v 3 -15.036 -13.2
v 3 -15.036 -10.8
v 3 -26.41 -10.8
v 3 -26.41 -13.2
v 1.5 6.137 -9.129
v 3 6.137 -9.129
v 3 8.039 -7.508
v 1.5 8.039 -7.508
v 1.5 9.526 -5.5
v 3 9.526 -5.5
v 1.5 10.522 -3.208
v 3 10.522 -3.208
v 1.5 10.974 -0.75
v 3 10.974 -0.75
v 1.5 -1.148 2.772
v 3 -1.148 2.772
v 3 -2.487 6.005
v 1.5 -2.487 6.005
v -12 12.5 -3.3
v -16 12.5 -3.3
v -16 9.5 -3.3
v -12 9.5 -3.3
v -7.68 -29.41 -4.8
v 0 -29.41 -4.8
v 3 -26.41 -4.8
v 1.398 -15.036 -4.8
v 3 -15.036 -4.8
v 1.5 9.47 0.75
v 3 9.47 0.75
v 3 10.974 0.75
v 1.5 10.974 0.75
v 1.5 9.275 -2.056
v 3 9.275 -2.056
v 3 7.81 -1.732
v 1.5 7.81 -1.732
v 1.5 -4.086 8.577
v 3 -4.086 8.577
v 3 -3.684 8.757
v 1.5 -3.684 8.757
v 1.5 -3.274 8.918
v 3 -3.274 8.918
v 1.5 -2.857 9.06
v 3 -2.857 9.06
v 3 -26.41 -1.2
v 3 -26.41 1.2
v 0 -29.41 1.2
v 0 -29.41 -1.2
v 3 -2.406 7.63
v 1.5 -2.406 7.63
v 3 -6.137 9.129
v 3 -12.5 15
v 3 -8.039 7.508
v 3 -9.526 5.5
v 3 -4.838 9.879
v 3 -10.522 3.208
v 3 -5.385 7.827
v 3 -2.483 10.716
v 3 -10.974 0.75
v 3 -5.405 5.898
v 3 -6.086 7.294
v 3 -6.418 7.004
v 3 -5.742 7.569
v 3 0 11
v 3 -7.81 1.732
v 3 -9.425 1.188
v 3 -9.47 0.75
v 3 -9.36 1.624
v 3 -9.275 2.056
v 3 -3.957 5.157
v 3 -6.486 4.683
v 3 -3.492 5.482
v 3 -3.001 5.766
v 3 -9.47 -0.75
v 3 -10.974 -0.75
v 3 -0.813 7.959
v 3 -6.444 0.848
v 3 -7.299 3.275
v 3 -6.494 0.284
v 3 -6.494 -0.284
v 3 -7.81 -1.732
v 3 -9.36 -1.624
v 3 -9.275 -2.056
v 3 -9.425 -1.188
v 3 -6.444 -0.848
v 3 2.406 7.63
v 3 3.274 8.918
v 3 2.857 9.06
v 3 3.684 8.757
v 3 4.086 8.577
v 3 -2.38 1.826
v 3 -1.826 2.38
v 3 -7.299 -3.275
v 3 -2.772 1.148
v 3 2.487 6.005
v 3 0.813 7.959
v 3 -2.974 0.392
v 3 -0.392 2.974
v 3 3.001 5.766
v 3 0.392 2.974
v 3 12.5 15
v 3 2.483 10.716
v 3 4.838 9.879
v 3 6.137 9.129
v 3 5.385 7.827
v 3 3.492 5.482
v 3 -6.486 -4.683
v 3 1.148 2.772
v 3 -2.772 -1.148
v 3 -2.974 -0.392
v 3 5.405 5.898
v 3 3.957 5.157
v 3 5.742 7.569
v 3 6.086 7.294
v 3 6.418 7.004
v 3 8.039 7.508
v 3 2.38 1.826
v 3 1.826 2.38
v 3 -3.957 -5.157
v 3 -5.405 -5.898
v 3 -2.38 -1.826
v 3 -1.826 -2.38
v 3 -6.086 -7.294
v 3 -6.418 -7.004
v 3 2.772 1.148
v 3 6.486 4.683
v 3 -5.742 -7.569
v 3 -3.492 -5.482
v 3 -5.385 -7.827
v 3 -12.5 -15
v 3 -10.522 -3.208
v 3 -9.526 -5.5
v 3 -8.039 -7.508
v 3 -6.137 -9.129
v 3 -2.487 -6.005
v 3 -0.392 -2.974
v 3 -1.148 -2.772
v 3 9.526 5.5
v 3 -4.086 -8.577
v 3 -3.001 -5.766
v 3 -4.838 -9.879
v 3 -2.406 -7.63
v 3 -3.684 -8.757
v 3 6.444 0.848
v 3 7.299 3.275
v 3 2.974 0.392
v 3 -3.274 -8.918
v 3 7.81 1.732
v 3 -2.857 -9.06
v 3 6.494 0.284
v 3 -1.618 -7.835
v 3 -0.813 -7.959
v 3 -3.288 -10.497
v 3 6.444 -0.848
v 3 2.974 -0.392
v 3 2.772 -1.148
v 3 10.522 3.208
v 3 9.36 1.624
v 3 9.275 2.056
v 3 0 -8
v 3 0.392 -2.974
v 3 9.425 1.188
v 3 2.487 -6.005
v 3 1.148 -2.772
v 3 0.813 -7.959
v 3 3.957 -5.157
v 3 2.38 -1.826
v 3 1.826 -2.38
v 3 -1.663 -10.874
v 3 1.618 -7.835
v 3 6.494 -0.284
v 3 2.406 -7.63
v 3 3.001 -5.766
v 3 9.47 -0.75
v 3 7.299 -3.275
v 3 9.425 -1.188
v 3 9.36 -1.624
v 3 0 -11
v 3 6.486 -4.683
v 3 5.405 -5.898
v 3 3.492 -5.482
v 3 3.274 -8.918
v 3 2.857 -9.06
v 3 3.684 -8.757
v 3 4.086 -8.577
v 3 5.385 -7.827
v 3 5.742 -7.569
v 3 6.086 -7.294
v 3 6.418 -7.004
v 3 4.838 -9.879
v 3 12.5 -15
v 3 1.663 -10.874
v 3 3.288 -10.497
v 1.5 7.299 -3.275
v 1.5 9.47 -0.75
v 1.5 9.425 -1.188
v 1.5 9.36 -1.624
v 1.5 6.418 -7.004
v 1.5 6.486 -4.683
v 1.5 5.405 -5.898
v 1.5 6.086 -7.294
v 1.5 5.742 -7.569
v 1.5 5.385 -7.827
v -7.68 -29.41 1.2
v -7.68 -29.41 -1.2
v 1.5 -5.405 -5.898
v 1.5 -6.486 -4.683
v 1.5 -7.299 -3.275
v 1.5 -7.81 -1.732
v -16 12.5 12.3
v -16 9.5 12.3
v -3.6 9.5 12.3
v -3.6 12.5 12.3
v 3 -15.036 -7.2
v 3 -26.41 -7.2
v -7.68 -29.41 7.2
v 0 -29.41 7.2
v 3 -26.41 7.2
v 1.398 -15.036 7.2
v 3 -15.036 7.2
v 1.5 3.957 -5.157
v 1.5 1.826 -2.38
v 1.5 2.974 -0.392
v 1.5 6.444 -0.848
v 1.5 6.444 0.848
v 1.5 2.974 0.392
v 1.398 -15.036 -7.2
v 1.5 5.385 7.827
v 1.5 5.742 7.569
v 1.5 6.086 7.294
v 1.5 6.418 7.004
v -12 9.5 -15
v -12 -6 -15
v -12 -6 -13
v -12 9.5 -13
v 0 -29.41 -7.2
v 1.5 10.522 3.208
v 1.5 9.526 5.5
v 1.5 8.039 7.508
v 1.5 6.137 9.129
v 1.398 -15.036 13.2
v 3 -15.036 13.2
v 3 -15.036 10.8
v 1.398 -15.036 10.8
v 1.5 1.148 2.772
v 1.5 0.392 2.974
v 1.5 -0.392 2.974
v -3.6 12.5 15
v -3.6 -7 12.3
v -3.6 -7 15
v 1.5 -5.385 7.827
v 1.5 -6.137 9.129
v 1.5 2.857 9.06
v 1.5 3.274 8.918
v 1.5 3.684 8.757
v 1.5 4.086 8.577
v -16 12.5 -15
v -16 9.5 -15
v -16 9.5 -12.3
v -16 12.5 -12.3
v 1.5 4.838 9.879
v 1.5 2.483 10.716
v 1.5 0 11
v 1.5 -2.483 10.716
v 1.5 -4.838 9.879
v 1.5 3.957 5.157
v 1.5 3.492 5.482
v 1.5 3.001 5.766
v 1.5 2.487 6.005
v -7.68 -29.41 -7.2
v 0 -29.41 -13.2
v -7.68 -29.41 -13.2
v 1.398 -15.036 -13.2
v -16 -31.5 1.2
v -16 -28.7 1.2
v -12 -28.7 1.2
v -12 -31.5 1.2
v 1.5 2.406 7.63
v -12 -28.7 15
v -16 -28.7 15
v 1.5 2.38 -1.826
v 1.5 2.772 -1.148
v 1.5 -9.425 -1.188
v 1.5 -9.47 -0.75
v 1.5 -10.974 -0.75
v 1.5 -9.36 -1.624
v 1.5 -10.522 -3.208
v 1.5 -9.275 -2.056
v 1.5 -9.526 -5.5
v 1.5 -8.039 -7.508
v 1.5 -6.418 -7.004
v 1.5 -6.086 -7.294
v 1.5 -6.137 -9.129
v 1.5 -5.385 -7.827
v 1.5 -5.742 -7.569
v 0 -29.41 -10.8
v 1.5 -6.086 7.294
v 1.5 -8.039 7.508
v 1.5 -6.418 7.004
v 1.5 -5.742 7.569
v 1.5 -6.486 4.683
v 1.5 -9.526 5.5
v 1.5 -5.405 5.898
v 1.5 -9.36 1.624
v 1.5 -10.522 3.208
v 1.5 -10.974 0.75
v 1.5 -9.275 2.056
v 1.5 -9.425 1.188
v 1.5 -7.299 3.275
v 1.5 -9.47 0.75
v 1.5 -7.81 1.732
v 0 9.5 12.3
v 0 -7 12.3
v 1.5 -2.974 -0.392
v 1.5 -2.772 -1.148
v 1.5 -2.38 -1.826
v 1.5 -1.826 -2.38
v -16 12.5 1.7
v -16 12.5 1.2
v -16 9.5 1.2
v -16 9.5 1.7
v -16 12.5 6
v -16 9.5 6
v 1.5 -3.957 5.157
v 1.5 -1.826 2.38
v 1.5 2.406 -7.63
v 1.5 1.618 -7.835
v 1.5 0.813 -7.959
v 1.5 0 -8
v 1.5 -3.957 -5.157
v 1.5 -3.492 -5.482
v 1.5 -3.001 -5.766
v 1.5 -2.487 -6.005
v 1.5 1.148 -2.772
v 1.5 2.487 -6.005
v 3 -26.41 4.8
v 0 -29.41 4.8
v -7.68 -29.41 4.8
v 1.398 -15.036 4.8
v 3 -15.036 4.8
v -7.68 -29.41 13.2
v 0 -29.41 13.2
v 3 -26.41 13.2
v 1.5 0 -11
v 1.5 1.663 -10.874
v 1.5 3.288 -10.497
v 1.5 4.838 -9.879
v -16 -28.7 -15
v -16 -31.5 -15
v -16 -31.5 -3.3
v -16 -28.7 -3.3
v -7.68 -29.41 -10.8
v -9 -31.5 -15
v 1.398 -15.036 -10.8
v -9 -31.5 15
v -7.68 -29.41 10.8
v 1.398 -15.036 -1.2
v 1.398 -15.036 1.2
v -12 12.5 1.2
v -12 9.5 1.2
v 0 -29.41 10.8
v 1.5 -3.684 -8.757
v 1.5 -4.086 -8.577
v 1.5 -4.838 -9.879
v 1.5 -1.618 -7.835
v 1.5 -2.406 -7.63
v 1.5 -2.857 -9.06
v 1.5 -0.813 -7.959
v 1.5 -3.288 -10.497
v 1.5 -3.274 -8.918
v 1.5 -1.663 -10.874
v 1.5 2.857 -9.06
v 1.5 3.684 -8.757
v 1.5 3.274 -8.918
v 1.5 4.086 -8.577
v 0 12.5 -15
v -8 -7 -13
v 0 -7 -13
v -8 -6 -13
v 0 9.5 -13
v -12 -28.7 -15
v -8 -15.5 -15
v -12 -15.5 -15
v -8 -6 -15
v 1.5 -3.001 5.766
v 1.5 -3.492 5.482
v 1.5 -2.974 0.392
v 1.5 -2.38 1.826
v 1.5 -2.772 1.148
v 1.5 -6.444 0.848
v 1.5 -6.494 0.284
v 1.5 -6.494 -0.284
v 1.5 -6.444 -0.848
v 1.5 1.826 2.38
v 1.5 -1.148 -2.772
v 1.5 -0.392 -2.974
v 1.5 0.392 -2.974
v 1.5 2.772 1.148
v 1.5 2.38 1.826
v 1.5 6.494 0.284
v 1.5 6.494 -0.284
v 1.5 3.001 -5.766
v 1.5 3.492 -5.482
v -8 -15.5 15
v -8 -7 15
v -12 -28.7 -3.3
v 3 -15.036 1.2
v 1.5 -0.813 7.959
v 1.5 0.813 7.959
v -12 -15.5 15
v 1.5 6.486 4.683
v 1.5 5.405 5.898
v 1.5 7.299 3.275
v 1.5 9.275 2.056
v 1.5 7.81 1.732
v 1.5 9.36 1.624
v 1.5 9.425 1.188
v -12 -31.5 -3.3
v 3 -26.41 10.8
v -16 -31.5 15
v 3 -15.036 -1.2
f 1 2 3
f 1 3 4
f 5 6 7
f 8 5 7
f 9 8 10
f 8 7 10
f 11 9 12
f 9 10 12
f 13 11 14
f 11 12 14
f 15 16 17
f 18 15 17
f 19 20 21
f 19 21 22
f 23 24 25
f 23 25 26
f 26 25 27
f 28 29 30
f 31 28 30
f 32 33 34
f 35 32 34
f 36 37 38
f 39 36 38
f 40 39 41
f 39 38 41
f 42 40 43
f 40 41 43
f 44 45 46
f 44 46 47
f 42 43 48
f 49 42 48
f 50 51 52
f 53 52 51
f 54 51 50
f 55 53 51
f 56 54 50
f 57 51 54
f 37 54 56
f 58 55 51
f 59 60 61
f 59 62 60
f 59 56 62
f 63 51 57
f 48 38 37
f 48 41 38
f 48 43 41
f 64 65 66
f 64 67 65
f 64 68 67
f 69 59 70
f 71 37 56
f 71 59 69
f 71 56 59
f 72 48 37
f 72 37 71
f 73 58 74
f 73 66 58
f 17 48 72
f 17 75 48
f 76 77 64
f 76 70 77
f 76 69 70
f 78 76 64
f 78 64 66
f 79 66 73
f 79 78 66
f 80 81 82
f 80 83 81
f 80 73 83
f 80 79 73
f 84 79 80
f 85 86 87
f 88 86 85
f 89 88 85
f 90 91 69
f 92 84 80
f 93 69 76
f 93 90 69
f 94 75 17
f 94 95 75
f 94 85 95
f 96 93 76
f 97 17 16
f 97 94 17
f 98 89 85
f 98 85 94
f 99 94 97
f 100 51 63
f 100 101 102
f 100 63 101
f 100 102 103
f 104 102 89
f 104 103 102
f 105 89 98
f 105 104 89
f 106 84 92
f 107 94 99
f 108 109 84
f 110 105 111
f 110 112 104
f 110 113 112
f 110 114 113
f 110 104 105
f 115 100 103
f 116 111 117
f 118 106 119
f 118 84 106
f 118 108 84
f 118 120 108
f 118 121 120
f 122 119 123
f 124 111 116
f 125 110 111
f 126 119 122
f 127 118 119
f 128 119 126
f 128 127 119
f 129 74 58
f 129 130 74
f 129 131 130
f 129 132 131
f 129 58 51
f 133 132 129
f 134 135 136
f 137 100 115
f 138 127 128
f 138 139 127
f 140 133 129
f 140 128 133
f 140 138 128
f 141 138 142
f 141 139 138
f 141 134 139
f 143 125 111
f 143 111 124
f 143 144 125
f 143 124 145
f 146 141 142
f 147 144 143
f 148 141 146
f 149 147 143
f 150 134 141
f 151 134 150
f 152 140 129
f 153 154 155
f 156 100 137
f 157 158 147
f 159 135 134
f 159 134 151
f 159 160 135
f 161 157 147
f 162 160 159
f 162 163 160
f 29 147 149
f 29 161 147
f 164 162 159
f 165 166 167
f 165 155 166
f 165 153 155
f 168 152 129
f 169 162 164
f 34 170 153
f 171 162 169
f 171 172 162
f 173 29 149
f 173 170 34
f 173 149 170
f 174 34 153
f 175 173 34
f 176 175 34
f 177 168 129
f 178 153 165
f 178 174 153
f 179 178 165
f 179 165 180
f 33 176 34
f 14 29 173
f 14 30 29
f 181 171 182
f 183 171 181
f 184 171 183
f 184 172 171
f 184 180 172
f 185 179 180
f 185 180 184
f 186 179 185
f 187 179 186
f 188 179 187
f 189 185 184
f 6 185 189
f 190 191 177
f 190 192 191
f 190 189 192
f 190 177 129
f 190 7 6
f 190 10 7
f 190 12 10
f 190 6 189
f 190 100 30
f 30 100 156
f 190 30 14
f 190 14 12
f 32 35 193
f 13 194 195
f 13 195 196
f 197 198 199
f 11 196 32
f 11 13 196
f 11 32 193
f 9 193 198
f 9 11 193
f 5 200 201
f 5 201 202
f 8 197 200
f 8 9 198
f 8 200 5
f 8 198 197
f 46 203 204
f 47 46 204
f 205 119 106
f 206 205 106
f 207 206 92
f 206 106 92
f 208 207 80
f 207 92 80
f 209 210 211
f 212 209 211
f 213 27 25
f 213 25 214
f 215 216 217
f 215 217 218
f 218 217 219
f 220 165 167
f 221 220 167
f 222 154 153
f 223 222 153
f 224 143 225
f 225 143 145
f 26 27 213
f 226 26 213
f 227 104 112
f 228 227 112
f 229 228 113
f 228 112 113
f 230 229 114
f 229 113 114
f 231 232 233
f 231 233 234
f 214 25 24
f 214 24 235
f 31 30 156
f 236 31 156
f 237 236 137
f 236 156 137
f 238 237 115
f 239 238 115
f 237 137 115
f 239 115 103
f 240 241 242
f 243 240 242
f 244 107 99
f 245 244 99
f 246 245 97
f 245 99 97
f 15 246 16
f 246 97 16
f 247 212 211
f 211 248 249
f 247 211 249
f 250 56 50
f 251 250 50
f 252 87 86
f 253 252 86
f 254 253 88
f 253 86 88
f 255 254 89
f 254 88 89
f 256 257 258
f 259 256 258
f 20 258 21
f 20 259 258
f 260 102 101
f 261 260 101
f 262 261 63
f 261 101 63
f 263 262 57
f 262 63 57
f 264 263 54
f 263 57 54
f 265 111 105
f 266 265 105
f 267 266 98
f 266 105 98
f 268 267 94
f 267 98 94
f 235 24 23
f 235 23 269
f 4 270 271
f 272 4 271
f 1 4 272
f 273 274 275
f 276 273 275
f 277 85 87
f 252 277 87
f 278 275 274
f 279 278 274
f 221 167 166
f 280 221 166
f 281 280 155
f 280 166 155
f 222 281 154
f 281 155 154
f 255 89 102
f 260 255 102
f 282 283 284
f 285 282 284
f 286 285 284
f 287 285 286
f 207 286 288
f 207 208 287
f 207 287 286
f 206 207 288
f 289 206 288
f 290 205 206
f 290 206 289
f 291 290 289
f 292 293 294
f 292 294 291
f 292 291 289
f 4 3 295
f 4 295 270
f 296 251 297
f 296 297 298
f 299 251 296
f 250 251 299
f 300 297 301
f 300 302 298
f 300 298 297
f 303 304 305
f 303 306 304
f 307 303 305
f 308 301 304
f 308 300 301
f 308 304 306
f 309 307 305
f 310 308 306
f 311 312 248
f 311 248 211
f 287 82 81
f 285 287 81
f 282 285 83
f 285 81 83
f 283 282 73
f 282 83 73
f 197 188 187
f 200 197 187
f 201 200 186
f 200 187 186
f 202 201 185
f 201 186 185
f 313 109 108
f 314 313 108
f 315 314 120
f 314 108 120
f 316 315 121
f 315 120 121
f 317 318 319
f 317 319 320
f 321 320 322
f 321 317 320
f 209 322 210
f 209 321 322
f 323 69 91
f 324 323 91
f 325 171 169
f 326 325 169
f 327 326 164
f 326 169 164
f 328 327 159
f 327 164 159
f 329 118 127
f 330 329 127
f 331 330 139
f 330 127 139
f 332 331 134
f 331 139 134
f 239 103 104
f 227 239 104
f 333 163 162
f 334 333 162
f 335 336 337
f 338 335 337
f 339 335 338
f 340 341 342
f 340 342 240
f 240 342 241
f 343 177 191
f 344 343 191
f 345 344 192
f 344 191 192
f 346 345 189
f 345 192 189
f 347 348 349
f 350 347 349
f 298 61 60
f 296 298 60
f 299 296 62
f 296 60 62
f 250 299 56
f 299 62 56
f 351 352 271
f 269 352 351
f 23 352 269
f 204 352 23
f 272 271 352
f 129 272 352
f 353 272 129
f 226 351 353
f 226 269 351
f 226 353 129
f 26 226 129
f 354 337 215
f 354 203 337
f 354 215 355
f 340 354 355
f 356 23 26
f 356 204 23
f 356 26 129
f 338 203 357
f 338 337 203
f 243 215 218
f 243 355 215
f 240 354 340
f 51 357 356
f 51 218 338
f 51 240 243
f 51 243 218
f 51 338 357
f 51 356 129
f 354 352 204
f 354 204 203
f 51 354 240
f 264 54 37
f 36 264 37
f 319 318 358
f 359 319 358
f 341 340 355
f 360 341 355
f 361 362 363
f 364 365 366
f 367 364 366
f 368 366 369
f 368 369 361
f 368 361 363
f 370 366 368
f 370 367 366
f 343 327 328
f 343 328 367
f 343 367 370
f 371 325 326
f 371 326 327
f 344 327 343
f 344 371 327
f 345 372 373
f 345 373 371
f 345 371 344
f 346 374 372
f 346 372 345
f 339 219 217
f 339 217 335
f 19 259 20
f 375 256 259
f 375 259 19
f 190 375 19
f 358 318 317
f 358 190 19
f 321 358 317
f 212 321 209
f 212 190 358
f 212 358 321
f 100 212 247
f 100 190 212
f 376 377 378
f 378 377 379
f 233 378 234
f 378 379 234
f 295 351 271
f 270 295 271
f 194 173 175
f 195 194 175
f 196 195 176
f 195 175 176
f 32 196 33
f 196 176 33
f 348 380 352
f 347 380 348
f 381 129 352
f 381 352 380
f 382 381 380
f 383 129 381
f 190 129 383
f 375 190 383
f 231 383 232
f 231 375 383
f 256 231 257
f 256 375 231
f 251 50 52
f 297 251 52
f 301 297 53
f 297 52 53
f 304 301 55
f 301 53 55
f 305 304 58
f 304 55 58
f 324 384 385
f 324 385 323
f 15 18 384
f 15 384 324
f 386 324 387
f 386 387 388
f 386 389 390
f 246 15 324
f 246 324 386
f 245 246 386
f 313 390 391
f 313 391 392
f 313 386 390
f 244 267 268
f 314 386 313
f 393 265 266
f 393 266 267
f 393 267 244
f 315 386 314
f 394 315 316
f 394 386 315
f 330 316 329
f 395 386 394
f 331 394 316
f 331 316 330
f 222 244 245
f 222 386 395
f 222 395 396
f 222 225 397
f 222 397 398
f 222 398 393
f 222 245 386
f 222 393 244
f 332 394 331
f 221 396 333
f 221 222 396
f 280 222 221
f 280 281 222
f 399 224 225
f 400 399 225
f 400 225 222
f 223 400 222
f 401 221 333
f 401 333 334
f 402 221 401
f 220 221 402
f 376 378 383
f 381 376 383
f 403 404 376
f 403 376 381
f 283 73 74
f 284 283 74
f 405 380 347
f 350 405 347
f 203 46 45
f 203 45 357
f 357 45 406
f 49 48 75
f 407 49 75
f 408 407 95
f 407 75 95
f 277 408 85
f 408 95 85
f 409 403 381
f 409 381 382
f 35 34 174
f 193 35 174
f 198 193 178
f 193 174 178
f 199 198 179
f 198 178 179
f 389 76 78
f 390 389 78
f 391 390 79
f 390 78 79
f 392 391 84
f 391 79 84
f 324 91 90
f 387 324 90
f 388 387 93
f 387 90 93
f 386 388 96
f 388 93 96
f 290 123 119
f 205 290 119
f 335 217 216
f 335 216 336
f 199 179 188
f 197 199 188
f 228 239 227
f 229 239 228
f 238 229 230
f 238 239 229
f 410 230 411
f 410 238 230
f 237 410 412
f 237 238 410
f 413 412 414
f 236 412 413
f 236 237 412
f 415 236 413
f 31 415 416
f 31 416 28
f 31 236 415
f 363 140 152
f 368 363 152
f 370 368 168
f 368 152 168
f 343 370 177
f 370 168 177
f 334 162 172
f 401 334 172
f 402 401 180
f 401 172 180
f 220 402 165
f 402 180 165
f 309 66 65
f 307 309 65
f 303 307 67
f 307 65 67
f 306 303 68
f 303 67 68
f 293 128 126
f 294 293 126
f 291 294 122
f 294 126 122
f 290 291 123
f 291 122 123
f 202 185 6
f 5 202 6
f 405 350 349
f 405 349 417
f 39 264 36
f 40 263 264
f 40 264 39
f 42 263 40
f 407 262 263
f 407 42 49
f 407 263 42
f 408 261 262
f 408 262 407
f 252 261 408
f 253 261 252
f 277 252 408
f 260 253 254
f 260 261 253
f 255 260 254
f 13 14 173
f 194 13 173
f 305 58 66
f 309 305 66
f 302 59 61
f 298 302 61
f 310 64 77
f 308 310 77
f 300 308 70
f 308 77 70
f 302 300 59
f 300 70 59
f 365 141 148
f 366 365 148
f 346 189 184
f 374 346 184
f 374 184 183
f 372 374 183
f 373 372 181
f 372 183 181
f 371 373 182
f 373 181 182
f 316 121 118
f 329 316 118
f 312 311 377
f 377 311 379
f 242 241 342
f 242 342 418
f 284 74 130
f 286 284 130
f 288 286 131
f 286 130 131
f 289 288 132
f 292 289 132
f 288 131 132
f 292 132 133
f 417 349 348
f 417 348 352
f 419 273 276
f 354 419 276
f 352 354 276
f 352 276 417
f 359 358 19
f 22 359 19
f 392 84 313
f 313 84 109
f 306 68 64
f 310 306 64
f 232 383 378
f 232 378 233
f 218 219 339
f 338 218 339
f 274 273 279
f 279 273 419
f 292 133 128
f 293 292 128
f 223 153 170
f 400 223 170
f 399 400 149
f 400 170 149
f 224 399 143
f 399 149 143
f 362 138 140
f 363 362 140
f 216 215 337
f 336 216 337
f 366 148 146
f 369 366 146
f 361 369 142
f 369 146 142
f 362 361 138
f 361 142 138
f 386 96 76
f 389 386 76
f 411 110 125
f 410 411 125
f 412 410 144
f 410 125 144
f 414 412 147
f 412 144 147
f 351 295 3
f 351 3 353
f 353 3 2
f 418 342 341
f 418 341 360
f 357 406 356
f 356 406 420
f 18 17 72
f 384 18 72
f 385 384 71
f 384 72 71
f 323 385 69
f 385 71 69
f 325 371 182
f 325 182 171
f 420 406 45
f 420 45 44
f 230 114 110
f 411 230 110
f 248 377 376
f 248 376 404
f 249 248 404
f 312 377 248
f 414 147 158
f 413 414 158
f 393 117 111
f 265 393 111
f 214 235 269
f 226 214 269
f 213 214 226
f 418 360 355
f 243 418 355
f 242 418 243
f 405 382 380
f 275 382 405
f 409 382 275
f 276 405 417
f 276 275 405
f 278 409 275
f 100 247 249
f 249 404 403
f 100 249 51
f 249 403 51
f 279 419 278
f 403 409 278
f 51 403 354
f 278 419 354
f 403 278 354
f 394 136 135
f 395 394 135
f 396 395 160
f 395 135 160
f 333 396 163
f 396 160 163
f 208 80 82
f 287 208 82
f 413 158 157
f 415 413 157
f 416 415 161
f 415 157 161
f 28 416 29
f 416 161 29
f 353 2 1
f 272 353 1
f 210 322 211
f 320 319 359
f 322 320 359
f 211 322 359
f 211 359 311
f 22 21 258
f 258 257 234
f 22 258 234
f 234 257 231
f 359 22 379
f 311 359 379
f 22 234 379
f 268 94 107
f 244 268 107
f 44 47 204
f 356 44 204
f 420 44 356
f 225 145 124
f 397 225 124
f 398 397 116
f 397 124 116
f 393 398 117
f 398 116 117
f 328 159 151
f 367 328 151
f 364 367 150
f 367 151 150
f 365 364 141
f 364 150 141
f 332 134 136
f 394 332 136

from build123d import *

# Parameters (mm, degrees)
SKETCH1_W            = 30
SKETCH1_H            = 25
BOSS_EXTRUDE1_DEPTH  = 3
SKETCH2_W            = 9
SKETCH2_H            = 3
SKETCH2_W_2          = 14
BOSS_EXTRUDE2_DEPTH  = 16
SKETCH3_W            = 4.3
SKETCH3_H            = 3
BOSS_EXTRUDE3_DEPTH  = 12
SKETCH4_W            = 30
SKETCH4_H            = 5.5
BOSS_EXTRUDE4_DEPTH  = 8
BOSS_EXTRUDE5_DEPTH  = 30
SKETCH7_W            = 4
SKETCH7_H            = 9
SKETCH7_H_2          = 16.7
BOSS_EXTRUDE6_DEPTH  = 3
BOSS_EXTRUDE8_REACH  = 41.727
SKETCH11_W           = 2.4
SKETCH11_H           = 14.373311352
CHAMFER1_SIZE        = 3
SKETCH12_R           = 3
CUT_EXTRUDE1_DEPTH   = 1.5
SKETCH13_W           = 2.7
SKETCH13_H           = 19.5
BOSS_EXTRUDE9_DEPTH  = 3.6
SKETCH15_W           = 12
SKETCH15_H           = 16.5
BOSS_EXTRUDE11_DEPTH = 2
SKETCH16_W           = 16.679178025
SKETCH16_H           = 22.840052547
BOSS_EXTRUDE12_DEPTH = 3
SKETCH17_W           = 12.4
SKETCH17_H           = 2.7
CUT_EXTRUDE2_DEPTH   = 13
SKETCH18_W           = 4
SKETCH18_H           = 4.5
CUT_EXTRUDE4_DEPTH   = 50.162994213
SKETCH19_W           = 4
SKETCH19_H           = 4.3
BOSS_EXTRUDE13_DEPTH = 3
SKETCH20_W           = 4
SKETCH20_H           = 1
CUT_EXTRUDE5_DEPTH   = 13
SKETCH21_W           = 4
SKETCH21_H           = 0.2
CUT_EXTRUDE6_DEPTH   = 47.349217901


with BuildPart() as part:
    # Sketch1 → Boss-Extrude1 (new body)
    with BuildSketch(Plane(origin=(0, 0, 0), x_dir=(0, 0, -1), z_dir=(1, 0, 0))):
        Rectangle(SKETCH1_W, SKETCH1_H)
    extrude(amount=BOSS_EXTRUDE1_DEPTH)

    # Sketch2 → Boss-Extrude2 (add)
    with BuildSketch(Plane.ZY):
        with Locations((10.5, 11)):
            Rectangle(SKETCH2_W, SKETCH2_H)
        with Locations((-5.3, 11)):
            Rectangle(SKETCH2_W_2, SKETCH2_H)
    extrude(amount=BOSS_EXTRUDE2_DEPTH)

    # Sketch3 → Boss-Extrude3 (add)
    with BuildSketch(Plane.ZY):
        with Locations((3.85, 11)):
            Rectangle(SKETCH3_W, SKETCH3_H)
    extrude(amount=BOSS_EXTRUDE3_DEPTH)

    # Sketch4 → Boss-Extrude4 (add)
    with BuildSketch(Plane.ZY):
        with Locations((0, -9.75)):
            Rectangle(SKETCH4_W, SKETCH4_H)
    extrude(amount=BOSS_EXTRUDE4_DEPTH)

    # Sketch5 → Boss-Extrude5 (add)
    with BuildSketch(Plane.XY.offset(15)):
        Polygon((-12, -31.5), (-9, -31.5), (3, -12.5), (-8, -12.5), (-8, -15.5), (-12, -15.5), align=None)
    extrude(amount=-BOSS_EXTRUDE5_DEPTH)

    # Sketch7 → Boss-Extrude6 (add)
    with BuildSketch(Plane.XZ.offset(31.5)):
        with Locations((-14, 10.5)):
            Rectangle(SKETCH7_W, SKETCH7_H)
        with Locations((-14, -6.65)):
            Rectangle(SKETCH7_W, SKETCH7_H_2)
    extrude(amount=-BOSS_EXTRUDE6_DEPTH)

    # Boss-Extrude8: up to this plane
    boss_extrude8_end = Plane(origin=(-9, -31.5, -39.207436874), z_dir=(0.8454889030309711, -0.5339929913879816, 0))
    # Sketch11 → Boss-Extrude8 (add, up to the surface)
    with BuildSketch(Plane(origin=(3, 0, 0), x_dir=(0, 0, -1), z_dir=(1, 0, 0)), mode=Mode.PRIVATE) as boss_extrude8_sk1:
        with Locations((-12, -22.223122385)):
            Rectangle(SKETCH11_W, SKETCH11_H)
    boss_extrude8_tool1 = split(extrude(boss_extrude8_sk1.sketch, amount=-BOSS_EXTRUDE8_REACH, mode=Mode.PRIVATE), bisect_by=boss_extrude8_end, keep=Keep.BOTH, mode=Mode.PRIVATE)
    add(boss_extrude8_tool1.solids().sort_by_distance((3, -22.223122, 12))[0])
    # Sketch11 → Boss-Extrude8 (add, up to the surface)
    with BuildSketch(Plane(origin=(3, 0, 0), x_dir=(0, 0, -1), z_dir=(1, 0, 0)), mode=Mode.PRIVATE) as boss_extrude8_sk2:
        with Locations((-6, -22.223122385)):
            Rectangle(SKETCH11_W, SKETCH11_H)
    boss_extrude8_tool2 = split(extrude(boss_extrude8_sk2.sketch, amount=-BOSS_EXTRUDE8_REACH, mode=Mode.PRIVATE), bisect_by=boss_extrude8_end, keep=Keep.BOTH, mode=Mode.PRIVATE)
    add(boss_extrude8_tool2.solids().sort_by_distance((3, -22.223122, 6))[0])
    # Sketch11 → Boss-Extrude8 (add, up to the surface)
    with BuildSketch(Plane(origin=(3, 0, 0), x_dir=(0, 0, -1), z_dir=(1, 0, 0)), mode=Mode.PRIVATE) as boss_extrude8_sk3:
        with Locations((0, -22.223122385)):
            Rectangle(SKETCH11_W, SKETCH11_H)
    boss_extrude8_tool3 = split(extrude(boss_extrude8_sk3.sketch, amount=-BOSS_EXTRUDE8_REACH, mode=Mode.PRIVATE), bisect_by=boss_extrude8_end, keep=Keep.BOTH, mode=Mode.PRIVATE)
    add(boss_extrude8_tool3.solids().sort_by_distance((3, -22.223122, 0))[0])
    # Sketch11 → Boss-Extrude8 (add, up to the surface)
    with BuildSketch(Plane(origin=(3, 0, 0), x_dir=(0, 0, -1), z_dir=(1, 0, 0)), mode=Mode.PRIVATE) as boss_extrude8_sk4:
        with Locations((6, -22.223122385)):
            Rectangle(SKETCH11_W, SKETCH11_H)
    boss_extrude8_tool4 = split(extrude(boss_extrude8_sk4.sketch, amount=-BOSS_EXTRUDE8_REACH, mode=Mode.PRIVATE), bisect_by=boss_extrude8_end, keep=Keep.BOTH, mode=Mode.PRIVATE)
    add(boss_extrude8_tool4.solids().sort_by_distance((3, -22.223122, -6))[0])
    # Sketch11 → Boss-Extrude8 (add, up to the surface)
    with BuildSketch(Plane(origin=(3, 0, 0), x_dir=(0, 0, -1), z_dir=(1, 0, 0)), mode=Mode.PRIVATE) as boss_extrude8_sk5:
        with Locations((12, -22.223122385)):
            Rectangle(SKETCH11_W, SKETCH11_H)
    boss_extrude8_tool5 = split(extrude(boss_extrude8_sk5.sketch, amount=-BOSS_EXTRUDE8_REACH, mode=Mode.PRIVATE), bisect_by=boss_extrude8_end, keep=Keep.BOTH, mode=Mode.PRIVATE)
    add(boss_extrude8_tool5.solids().sort_by_distance((3, -22.223122, -12))[0])

    # Chamfer1
    chamfer1_edges = [part.edges().sort_by_distance(p)[0] for p in [
        (3, -29.409778061, 12),
        (3, -29.409778061, 6),
        (3, -29.409778061, 0),
        (3, -29.409778061, -6),
        (3, -29.409778061, -12),
    ]]
    chamfer(chamfer1_edges, length=CHAMFER1_SIZE)

    # Sketch12 → Cut-Extrude1 (cut)
    with BuildSketch(Plane(origin=(3, 0, 0), x_dir=(0, 0, -1), z_dir=(1, 0, 0))):
        with BuildLine():
            Line((-0.75, 9.470348462), (-0.75, 10.974402034))
            ThreePointArc((-0.75, 10.974402034), (-5.5, 9.526279442), (-9.129110953, 6.13672007))
            Line((-9.129110953, 6.13672007), (-7.826562351, 5.384693284))
            ThreePointArc((-7.826562351, 5.384693284), (-7.433328979, 5.915709618), (-7.0041347, 6.418106972))
            ThreePointArc((-7.0041347, 6.418106972), (-4.75, 8.227241336), (-2.056176332, 9.274812068))
            ThreePointArc((-2.056176332, 9.274812068), (-1.406490321, 9.39530654), (-0.75, 9.470348462))
        make_face()
        with BuildLine():
            Line((-8.576562351, 4.085655178), (-9.879110953, 4.837681964))
            ThreePointArc((-9.879110953, 4.837681964), (-11, 0), (-9.879110953, -4.837681964))
            Line((-9.879110953, -4.837681964), (-8.576562351, -4.085655178))
            ThreePointArc((-8.576562351, -4.085655178), (-8.8398193, -3.479596922), (-9.060311032, -2.856705095))
            ThreePointArc((-9.060311032, -2.856705095), (-9.5, 0), (-9.060311032, 2.856705095))
            ThreePointArc((-9.060311032, 2.856705095), (-8.8398193, 3.479596922), (-8.576562351, 4.085655178))
        make_face()
        with BuildLine():
            Line((-7.826562351, -5.384693284), (-9.129110953, -6.13672007))
            ThreePointArc((-9.129110953, -6.13672007), (-5.5, -9.526279442), (-0.75, -10.974402034))
            Line((-0.75, -10.974402034), (-0.75, -9.470348462))
            ThreePointArc((-0.75, -9.470348462), (-1.406490321, -9.39530654), (-2.056176332, -9.274812068))
            ThreePointArc((-2.056176332, -9.274812068), (-4.75, -8.227241336), (-7.0041347, -6.418106972))
            ThreePointArc((-7.0041347, -6.418106972), (-7.433328979, -5.915709618), (-7.826562351, -5.384693284))
        make_face()
        with BuildLine():
            ThreePointArc((0.75, -10.974402034), (5.5, -9.526279442), (9.129110953, -6.13672007))
            Line((9.129110953, -6.13672007), (7.826562351, -5.384693284))
            ThreePointArc((7.826562351, -5.384693284), (7.433328979, -5.915709618), (7.0041347, -6.418106972))
            ThreePointArc((7.0041347, -6.418106972), (4.75, -8.227241336), (2.056176332, -9.274812068))
            ThreePointArc((2.056176332, -9.274812068), (1.406490321, -9.39530654), (0.75, -9.470348462))
            Line((0.75, -9.470348462), (0.75, -10.974402034))
        make_face()
        with BuildLine():
            ThreePointArc((11, 0), (10.716114512, 2.482919604), (9.879110953, 4.837681964))
            Line((9.879110953, 4.837681964), (8.576562351, 4.085655178))
            ThreePointArc((8.576562351, 4.085655178), (8.8398193, 3.479596922), (9.060311032, 2.856705095))
            ThreePointArc((9.060311032, 2.856705095), (9.389434349, 1.445172169), (9.5, 0))
            ThreePointArc((9.5, 0), (9.389434349, -1.445172169), (9.060311032, -2.856705095))
            ThreePointArc((9.060311032, -2.856705095), (8.8398193, -3.479596922), (8.576562351, -4.085655178))
            Line((8.576562351, -4.085655178), (9.879110953, -4.837681964))
            ThreePointArc((9.879110953, -4.837681964), (10.716114512, -2.482919604), (11, 0))
        make_face()
        with BuildLine():
            ThreePointArc((9.129110953, 6.13672007), (5.5, 9.526279442), (0.75, 10.974402034))
            Line((0.75, 10.974402034), (0.75, 9.470348462))
            ThreePointArc((0.75, 9.470348462), (1.406490321, 9.39530654), (2.056176332, 9.274812068))
            ThreePointArc((2.056176332, 9.274812068), (4.75, 8.227241336), (7.0041347, 6.418106972))
            ThreePointArc((7.0041347, 6.418106972), (7.433328979, 5.915709618), (7.826562351, 5.384693284))
            Line((7.826562351, 5.384693284), (9.129110953, 6.13672007))
        make_face()
        with BuildLine():
            Line((-1.731516912, 7.810368057), (-2.056176332, 9.274812068))
            ThreePointArc((-2.056176332, 9.274812068), (-4.75, 8.227241336), (-7.0041347, 6.418106972))
            Line((-7.0041347, 6.418106972), (-5.898218694, 5.404721661))
            ThreePointArc((-5.898218694, 5.404721661), (-4, 6.92820323), (-1.731516912, 7.810368057))
        make_face()
        with BuildLine():
            Line((-7.629735606, 2.405646396), (-9.060311032, 2.856705095))
            ThreePointArc((-9.060311032, 2.856705095), (-9.5, 0), (-9.060311032, -2.856705095))
            Line((-9.060311032, -2.856705095), (-7.629735606, -2.405646396))
            ThreePointArc((-7.629735606, -2.405646396), (-8, 0), (-7.629735606, 2.405646396))
        make_face()
        with BuildLine():
            Line((-5.898218694, -5.404721661), (-7.0041347, -6.418106972))
            ThreePointArc((-7.0041347, -6.418106972), (-4.75, -8.227241336), (-2.056176332, -9.274812068))
            Line((-2.056176332, -9.274812068), (-1.731516912, -7.810368057))
            ThreePointArc((-1.731516912, -7.810368057), (-4, -6.92820323), (-5.898218694, -5.404721661))
        make_face()
        with BuildLine():
            ThreePointArc((2.056176332, -9.274812068), (4.75, -8.227241336), (7.0041347, -6.418106972))
            Line((7.0041347, -6.418106972), (5.898218694, -5.404721661))
            ThreePointArc((5.898218694, -5.404721661), (4, -6.92820323), (1.731516912, -7.810368057))
            Line((1.731516912, -7.810368057), (2.056176332, -9.274812068))
        make_face()
        with BuildLine():
            ThreePointArc((9.5, 0), (9.389434349, 1.445172169), (9.060311032, 2.856705095))
            Line((9.060311032, 2.856705095), (7.629735606, 2.405646396))
            ThreePointArc((7.629735606, 2.405646396), (7.906892084, 1.21698709), (8, 0))
            ThreePointArc((8, 0), (7.906892084, -1.21698709), (7.629735606, -2.405646396))
            Line((7.629735606, -2.405646396), (9.060311032, -2.856705095))
            ThreePointArc((9.060311032, -2.856705095), (9.389434349, -1.445172169), (9.5, 0))
        make_face()
        with BuildLine():
            ThreePointArc((7.0041347, 6.418106972), (4.75, 8.227241336), (2.056176332, 9.274812068))
            Line((2.056176332, 9.274812068), (1.731516912, 7.810368057))
            ThreePointArc((1.731516912, 7.810368057), (4, 6.92820323), (5.898218694, 5.404721661))
            Line((5.898218694, 5.404721661), (7.0041347, 6.418106972))
        make_face()
        with BuildLine():
            Line((-2.380060021, 1.826284287), (-5.156796712, 3.956949289))
            ThreePointArc((-5.156796712, 3.956949289), (-5.629165125, 3.25), (-6.005216961, 2.48744231))
            Line((-6.005216961, 2.48744231), (-2.771638598, 1.148050297))
            ThreePointArc((-2.771638598, 1.148050297), (-2.598076211, 1.5), (-2.380060021, 1.826284287))
        make_face()
        with BuildLine():
            Line((-2.771638598, -1.148050297), (-6.005216961, -2.48744231))
            ThreePointArc((-6.005216961, -2.48744231), (-5.629165125, -3.25), (-5.156796712, -3.956949289))
            Line((-5.156796712, -3.956949289), (-2.380060021, -1.826284287))
            ThreePointArc((-2.380060021, -1.826284287), (-2.598076211, -1.5), (-2.771638598, -1.148050297))
        make_face()
        with BuildLine():
            Line((-0.391578577, -2.974334584), (-0.848420249, -6.444391599))
            ThreePointArc((-0.848420249, -6.444391599), (0, -6.5), (0.848420249, -6.444391599))
            Line((0.848420249, -6.444391599), (0.391578577, -2.974334584))
            ThreePointArc((0.391578577, -2.974334584), (0, -3), (-0.391578577, -2.974334584))
        make_face()
        with BuildLine():
            ThreePointArc((5.156796712, -3.956949289), (5.629165125, -3.25), (6.005216961, -2.48744231))
            Line((6.005216961, -2.48744231), (2.771638598, -1.148050297))
            ThreePointArc((2.771638598, -1.148050297), (2.598076211, -1.5), (2.380060021, -1.826284287))
            Line((2.380060021, -1.826284287), (5.156796712, -3.956949289))
        make_face()
        with BuildLine():
            ThreePointArc((6.005216961, 2.48744231), (5.629165125, 3.25), (5.156796712, 3.956949289))
            Line((5.156796712, 3.956949289), (2.380060021, 1.826284287))
            ThreePointArc((2.380060021, 1.826284287), (2.598076211, 1.5), (2.771638598, 1.148050297))
            Line((2.771638598, 1.148050297), (6.005216961, 2.48744231))
        make_face()
        with BuildLine():
            ThreePointArc((0.848420249, 6.444391599), (0, 6.5), (-0.848420249, 6.444391599))
            Line((-0.848420249, 6.444391599), (-0.391578577, 2.974334584))
            ThreePointArc((-0.391578577, 2.974334584), (0, 3), (0.391578577, 2.974334584))
            Line((0.391578577, 2.974334584), (0.848420249, 6.444391599))
        make_face()
        Circle(SKETCH12_R)
    extrude(amount=-CUT_EXTRUDE1_DEPTH, mode=Mode.SUBTRACT)

    # Sketch13 → Boss-Extrude9 (add)
    with BuildSketch(Plane.ZY):
        with Locations((13.65, 2.75)):
            Rectangle(SKETCH13_W, SKETCH13_H)
    extrude(amount=BOSS_EXTRUDE9_DEPTH)

    # Sketch15 → Boss-Extrude11 (add)
    with BuildSketch(Plane(origin=(0, 0, -15), x_dir=(-1, 0, 0), z_dir=(0, 0, -1))):
        with Locations((6, 1.25)):
            Rectangle(SKETCH15_W, SKETCH15_H)
    extrude(amount=-BOSS_EXTRUDE11_DEPTH)

    # Sketch16 → Boss-Extrude12 (add)
    with BuildSketch(Plane(origin=(0, 12.5, 0), x_dir=(1, 0, 0), z_dir=(0, 1, 0))):
        with Locations((-7.660410987, 3.579973727)):
            Rectangle(SKETCH16_W, SKETCH16_H)
    extrude(amount=-BOSS_EXTRUDE12_DEPTH)

    # Sketch17 → Cut-Extrude2 (cut)
    with BuildSketch(Plane.XZ.offset(-9.5)):
        with Locations((-9.8, 13.65)):
            Rectangle(SKETCH17_W, SKETCH17_H)
    extrude(amount=-CUT_EXTRUDE2_DEPTH, mode=Mode.SUBTRACT)

    # Sketch18 → Cut-Extrude4 (cut, through all)
    with BuildSketch(Plane(origin=(0, 12.5, 0), x_dir=(1, 0, 0), z_dir=(0, 1, 0))):
        with Locations((-14, 1.05)):
            Rectangle(SKETCH18_W, SKETCH18_H)
    extrude(amount=-CUT_EXTRUDE4_DEPTH, mode=Mode.SUBTRACT)

    # Sketch19 → Boss-Extrude13 (add)
    with BuildSketch(Plane.XZ.offset(31.5)):
        with Locations((-14, 3.85)):
            Rectangle(SKETCH19_W, SKETCH19_H)
    extrude(amount=-BOSS_EXTRUDE13_DEPTH)

    # Sketch20 → Cut-Extrude5 (cut)
    with BuildSketch(Plane(origin=(0, 0, -15), x_dir=(-1, 0, 0), z_dir=(0, 0, -1))):
        with Locations((10, -6.5)):
            Rectangle(SKETCH20_W, SKETCH20_H)
    extrude(amount=-CUT_EXTRUDE5_DEPTH, mode=Mode.SUBTRACT)

    # Sketch21 → Cut-Extrude6 (cut, through all)
    with BuildSketch(Plane(origin=(0, 0, -15), x_dir=(-1, 0, 0), z_dir=(0, 0, -1))):
        with Locations((14, -28.6)):
            Rectangle(SKETCH21_W, SKETCH21_H)
    extrude(amount=-CUT_EXTRUDE6_DEPTH, mode=Mode.SUBTRACT)


solid = part.part
